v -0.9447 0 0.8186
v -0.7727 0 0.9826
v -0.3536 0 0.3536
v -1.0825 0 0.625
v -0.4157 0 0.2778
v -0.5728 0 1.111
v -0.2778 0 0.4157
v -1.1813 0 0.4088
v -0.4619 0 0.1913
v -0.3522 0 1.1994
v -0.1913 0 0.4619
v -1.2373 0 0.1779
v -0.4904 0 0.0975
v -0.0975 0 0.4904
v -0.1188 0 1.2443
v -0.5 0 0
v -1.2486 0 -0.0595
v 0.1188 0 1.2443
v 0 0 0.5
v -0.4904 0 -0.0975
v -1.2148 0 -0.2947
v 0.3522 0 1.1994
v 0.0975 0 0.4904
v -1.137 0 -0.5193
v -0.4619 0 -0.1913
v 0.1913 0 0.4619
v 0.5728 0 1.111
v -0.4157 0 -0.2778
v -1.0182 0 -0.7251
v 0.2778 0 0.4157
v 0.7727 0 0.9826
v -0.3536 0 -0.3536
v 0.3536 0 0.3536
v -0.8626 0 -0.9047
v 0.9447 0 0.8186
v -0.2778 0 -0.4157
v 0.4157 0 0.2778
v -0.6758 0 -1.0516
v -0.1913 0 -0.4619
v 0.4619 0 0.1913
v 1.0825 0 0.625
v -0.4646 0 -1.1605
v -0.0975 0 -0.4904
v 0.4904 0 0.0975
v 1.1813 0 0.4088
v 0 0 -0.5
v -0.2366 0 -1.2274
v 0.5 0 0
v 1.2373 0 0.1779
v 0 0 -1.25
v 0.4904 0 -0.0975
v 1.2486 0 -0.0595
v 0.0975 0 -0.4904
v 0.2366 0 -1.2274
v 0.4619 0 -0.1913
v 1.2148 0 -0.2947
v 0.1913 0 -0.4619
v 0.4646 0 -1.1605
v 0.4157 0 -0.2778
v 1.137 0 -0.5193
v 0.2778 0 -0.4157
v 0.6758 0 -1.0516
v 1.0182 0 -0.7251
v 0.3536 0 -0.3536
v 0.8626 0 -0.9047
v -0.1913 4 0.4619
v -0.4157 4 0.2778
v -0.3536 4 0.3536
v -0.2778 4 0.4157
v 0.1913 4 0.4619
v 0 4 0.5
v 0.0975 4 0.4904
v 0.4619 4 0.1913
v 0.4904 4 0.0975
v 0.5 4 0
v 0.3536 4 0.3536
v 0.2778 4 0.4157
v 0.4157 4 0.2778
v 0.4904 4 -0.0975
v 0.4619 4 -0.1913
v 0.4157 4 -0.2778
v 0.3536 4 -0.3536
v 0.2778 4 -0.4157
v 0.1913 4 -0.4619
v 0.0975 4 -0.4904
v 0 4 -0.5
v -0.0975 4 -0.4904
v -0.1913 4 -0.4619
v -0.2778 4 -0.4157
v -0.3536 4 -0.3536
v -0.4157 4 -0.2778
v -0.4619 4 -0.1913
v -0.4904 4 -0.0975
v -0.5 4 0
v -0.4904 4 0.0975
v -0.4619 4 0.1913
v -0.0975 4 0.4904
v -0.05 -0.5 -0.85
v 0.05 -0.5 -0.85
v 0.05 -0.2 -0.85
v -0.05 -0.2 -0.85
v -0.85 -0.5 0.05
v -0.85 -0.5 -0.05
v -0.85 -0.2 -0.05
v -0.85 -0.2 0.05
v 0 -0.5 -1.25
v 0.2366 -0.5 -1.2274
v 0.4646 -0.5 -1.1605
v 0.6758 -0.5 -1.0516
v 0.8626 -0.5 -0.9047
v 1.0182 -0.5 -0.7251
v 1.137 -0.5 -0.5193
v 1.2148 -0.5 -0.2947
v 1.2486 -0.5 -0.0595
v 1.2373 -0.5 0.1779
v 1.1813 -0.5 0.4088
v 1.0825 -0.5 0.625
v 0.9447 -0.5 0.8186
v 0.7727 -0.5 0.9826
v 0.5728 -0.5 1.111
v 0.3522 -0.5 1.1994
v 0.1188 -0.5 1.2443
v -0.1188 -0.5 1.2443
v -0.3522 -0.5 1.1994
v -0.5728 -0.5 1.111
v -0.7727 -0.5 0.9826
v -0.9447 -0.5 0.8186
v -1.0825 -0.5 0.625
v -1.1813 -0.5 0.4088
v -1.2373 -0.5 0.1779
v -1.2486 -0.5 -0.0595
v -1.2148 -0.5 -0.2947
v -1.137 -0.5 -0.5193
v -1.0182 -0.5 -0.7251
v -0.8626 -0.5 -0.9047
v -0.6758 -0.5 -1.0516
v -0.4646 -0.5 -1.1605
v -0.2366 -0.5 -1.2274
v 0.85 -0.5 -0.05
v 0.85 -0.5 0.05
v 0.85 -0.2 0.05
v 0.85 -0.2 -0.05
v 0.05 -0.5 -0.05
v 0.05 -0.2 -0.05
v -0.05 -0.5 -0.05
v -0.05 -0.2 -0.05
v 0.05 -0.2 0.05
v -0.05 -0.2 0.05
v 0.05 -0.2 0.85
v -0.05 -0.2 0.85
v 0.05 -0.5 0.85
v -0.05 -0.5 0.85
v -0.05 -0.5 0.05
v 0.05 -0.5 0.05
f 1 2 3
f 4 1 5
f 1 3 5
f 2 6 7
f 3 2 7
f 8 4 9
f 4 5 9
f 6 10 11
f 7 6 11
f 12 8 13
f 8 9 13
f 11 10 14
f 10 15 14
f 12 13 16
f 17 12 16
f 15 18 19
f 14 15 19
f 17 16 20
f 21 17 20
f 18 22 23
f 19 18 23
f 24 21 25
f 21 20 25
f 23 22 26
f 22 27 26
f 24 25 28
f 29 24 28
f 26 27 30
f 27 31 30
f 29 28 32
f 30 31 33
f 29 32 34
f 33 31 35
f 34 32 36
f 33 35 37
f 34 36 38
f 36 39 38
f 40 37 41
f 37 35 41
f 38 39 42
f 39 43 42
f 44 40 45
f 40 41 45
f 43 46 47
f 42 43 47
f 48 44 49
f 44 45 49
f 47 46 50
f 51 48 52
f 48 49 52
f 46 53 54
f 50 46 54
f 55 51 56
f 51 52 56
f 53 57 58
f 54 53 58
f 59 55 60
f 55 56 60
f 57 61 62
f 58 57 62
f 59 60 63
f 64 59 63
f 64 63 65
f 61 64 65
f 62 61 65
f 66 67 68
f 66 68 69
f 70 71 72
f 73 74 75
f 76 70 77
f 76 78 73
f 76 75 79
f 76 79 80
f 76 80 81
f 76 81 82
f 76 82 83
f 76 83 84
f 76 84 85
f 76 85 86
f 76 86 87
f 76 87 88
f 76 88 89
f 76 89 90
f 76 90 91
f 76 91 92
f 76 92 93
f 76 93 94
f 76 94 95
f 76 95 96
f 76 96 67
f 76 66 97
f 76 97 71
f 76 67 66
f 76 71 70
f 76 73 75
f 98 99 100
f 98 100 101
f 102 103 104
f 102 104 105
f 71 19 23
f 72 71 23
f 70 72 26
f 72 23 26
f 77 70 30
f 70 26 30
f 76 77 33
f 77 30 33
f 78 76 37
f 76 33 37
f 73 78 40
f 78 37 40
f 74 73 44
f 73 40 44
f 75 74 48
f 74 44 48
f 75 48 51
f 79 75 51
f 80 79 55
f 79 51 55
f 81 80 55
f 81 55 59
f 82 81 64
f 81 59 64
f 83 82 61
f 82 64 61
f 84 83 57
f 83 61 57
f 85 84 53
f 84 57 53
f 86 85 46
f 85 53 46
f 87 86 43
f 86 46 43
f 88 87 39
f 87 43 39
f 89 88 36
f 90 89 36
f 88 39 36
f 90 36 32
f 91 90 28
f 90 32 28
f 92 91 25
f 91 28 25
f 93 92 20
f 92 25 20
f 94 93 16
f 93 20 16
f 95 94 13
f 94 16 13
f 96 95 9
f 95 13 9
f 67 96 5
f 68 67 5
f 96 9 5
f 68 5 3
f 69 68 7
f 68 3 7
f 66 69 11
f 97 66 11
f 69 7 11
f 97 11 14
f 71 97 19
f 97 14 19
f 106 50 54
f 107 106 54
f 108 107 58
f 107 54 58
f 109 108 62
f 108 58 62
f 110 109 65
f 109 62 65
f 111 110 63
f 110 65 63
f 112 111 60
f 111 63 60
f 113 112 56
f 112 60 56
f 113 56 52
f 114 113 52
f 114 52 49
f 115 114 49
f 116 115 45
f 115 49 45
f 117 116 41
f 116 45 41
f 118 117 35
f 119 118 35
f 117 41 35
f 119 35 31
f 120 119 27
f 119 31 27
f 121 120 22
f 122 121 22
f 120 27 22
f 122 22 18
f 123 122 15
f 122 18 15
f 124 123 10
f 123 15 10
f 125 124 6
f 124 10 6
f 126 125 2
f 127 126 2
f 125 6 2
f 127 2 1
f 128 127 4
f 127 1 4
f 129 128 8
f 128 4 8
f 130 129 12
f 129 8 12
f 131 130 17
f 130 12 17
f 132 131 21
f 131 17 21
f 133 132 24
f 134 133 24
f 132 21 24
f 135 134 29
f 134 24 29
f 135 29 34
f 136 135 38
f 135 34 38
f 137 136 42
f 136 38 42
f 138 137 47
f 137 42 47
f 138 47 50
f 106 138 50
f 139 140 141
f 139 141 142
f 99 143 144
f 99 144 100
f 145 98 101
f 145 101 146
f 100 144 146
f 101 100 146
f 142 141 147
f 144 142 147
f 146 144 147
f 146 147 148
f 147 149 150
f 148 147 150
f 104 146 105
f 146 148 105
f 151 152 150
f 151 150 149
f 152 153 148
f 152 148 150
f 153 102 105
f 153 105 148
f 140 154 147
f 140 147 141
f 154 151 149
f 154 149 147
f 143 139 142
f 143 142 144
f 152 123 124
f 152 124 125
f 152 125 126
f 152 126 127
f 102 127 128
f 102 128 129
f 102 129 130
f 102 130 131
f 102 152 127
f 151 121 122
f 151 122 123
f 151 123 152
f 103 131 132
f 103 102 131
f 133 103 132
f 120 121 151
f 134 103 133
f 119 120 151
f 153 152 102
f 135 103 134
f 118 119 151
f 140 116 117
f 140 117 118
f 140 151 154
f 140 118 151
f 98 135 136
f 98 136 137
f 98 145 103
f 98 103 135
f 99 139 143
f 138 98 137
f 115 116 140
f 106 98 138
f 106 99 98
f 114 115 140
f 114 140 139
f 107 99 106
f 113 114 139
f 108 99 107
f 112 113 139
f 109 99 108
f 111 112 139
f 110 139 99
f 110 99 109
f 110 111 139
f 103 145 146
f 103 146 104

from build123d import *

# Parameters (mm, degrees)
SKETCH1_R           = 0.5
BOSS_EXTRUDE1_DEPTH = 4
SKETCH2_R           = 1.25
BOSS_EXTRUDE2_DEPTH = 0.5
CUT_EXTRUDE1_DEPTH  = 0.3


with BuildPart() as part:
    # Sketch1 → Boss-Extrude1 (new body)
    with BuildSketch(Plane(origin=(0, 0, 0), x_dir=(1, 0, 0), z_dir=(0, 1, 0))):
        with Locations(Location((0, 0, 0), (0, 0, 270))):
            Circle(SKETCH1_R)
    extrude(amount=BOSS_EXTRUDE1_DEPTH)

    # Sketch2 → Boss-Extrude2 (add)
    with BuildSketch(Plane.XZ):
        with Locations(Location((0, 0, 0), (0, 0, 270))):
            Circle(SKETCH2_R)
    extrude(amount=BOSS_EXTRUDE2_DEPTH)

    # Sketch3 → Cut-Extrude1 (cut)
    with BuildSketch(Plane.XZ.offset(0.5)):
        Polygon((-0.05, 0.85), (0.05, 0.85), (0.05, 0.05), (0.85, 0.05), (0.85, -0.05), (0.05, -0.05), (0.05, -0.85), (-0.05, -0.85), (-0.05, -0.05), (-0.85, -0.05), (-0.85, 0.05), (-0.05, 0.05), align=None)
    extrude(amount=-CUT_EXTRUDE1_DEPTH, mode=Mode.SUBTRACT)


solid = part.part
